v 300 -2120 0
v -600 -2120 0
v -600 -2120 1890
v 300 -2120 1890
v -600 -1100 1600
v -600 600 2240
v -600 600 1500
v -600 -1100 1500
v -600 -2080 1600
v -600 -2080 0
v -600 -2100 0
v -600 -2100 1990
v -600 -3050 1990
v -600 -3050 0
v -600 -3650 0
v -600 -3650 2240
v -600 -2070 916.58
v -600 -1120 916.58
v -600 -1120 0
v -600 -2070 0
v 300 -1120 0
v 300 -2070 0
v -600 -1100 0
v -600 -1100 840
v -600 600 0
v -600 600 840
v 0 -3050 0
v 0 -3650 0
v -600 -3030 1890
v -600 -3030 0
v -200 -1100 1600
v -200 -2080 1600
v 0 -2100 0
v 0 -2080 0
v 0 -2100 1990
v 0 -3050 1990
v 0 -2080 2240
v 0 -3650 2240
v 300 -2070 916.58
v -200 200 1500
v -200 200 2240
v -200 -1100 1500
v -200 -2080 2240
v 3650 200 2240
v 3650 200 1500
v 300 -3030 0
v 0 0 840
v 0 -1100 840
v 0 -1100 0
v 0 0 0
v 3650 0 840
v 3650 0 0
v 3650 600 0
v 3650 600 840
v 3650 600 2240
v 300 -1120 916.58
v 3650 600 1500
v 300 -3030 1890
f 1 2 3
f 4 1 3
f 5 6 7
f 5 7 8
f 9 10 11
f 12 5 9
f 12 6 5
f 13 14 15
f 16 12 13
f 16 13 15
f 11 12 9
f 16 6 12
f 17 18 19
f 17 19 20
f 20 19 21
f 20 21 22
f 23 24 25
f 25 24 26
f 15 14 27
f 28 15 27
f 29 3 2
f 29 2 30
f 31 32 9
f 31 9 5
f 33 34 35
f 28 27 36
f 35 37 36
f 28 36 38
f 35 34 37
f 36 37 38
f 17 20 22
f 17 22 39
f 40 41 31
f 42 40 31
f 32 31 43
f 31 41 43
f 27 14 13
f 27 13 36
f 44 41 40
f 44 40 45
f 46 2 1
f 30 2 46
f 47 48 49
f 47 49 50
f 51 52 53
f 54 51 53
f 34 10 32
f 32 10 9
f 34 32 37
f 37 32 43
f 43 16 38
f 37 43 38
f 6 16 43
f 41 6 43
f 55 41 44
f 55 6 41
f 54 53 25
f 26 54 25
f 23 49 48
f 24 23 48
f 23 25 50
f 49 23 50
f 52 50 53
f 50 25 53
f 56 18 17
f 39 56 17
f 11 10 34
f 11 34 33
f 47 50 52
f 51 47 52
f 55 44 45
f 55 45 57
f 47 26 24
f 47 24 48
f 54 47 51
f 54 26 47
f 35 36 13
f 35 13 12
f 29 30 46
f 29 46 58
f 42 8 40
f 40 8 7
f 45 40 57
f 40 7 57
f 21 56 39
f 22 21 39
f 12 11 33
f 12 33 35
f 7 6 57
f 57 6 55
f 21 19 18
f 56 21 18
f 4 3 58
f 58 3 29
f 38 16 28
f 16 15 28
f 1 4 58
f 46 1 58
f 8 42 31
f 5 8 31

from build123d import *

# Parameters (mm, degrees)
F1_DEPTH  = 840
F2_W      = 600
F2_H      = 600
F3_DEPTH  = 1400
F4_W      = 950
F4_H      = 250
F5_DEPTH  = 600
F6_W      = 1950
F6_H      = 840
F7_DEPTH  = 600.001
F8_W      = 20
F8_H      = 2240
F9_DEPTH  = 600
F10_W     = 2680
F10_H     = 740
F11_DEPTH = 400
F12_W     = 3850
F12_H     = 400
F13_DEPTH = 740
F14_W     = 980
F14_H     = 100
F15_DEPTH = 400.001
F16_W     = 910
F16_H     = 1890
F16_W_2   = 950
F16_H_2   = 916.58007
F17_DEPTH = 900


with BuildPart() as f1:
    # F0 (on Top) → F1 (new body)
    with BuildSketch(Plane.XY):
        Polygon((3650, 600), (-600, 600), (-600, -3650), (0, -3650), (0, 0), (3650, 0), align=None)
    extrude(amount=F1_DEPTH)

    # F2 (on face) → F3 (join)
    with BuildSketch(Plane.XY.offset(840)):
        with Locations((-300, -3350)):
            Rectangle(F2_W, F2_H)
    extrude(amount=F3_DEPTH)

    # F4 (on face) → F5 (join, through all)
    with BuildSketch(Plane.YZ):
        with Locations((-2575, 2115)):
            Rectangle(F4_W, F4_H)
    extrude(amount=-F5_DEPTH)

    # F6 (on face) → F7 (cut, through all)
    with BuildSketch(Plane.YZ):
        with Locations((-2075, 420)):
            Rectangle(F6_W, F6_H)
    extrude(amount=-F7_DEPTH, mode=Mode.SUBTRACT)

    # F8 (on face) → F9 (join, through all)
    with BuildSketch(Plane(origin=(-600, 0, 0), x_dir=(0, -1, 0), z_dir=(-1, 0, 0))):
        with Locations((2090, 1120)):
            Rectangle(F8_W, F8_H)
    extrude(amount=-F9_DEPTH)

    # F10 (on face) → F11 (join)
    with BuildSketch(Plane(origin=(-600, 0, 0), x_dir=(0, -1, 0), z_dir=(-1, 0, 0))):
        with Locations((740, 1870)):
            Rectangle(F10_W, F10_H)
    extrude(amount=-F11_DEPTH)

    # F12 (on face) → F13 (join, through all)
    with BuildSketch(Plane.XY.offset(2240)):
        with Locations((1725, 400)):
            Rectangle(F12_W, F12_H)
    extrude(amount=-F13_DEPTH)

    # F14 (on face) → F15 (cut, through all)
    with BuildSketch(Plane.YZ.offset(-200)):
        with Locations((-1590, 1550)):
            Rectangle(F14_W, F14_H)
    extrude(amount=-F15_DEPTH, mode=Mode.SUBTRACT)


with BuildPart() as f17:
    # F16 (on face) → F17 (new body)
    with BuildSketch(Plane(origin=(-600, 0, 0), x_dir=(0, -1, 0), z_dir=(-1, 0, 0))):
        with Locations((2575, 945)):
            Rectangle(F16_W, F16_H)
        with Locations((1595, 458.290035)):
            Rectangle(F16_W_2, F16_H_2)
    extrude(amount=-F17_DEPTH)


solid = Compound([f1.part, f17.part])
